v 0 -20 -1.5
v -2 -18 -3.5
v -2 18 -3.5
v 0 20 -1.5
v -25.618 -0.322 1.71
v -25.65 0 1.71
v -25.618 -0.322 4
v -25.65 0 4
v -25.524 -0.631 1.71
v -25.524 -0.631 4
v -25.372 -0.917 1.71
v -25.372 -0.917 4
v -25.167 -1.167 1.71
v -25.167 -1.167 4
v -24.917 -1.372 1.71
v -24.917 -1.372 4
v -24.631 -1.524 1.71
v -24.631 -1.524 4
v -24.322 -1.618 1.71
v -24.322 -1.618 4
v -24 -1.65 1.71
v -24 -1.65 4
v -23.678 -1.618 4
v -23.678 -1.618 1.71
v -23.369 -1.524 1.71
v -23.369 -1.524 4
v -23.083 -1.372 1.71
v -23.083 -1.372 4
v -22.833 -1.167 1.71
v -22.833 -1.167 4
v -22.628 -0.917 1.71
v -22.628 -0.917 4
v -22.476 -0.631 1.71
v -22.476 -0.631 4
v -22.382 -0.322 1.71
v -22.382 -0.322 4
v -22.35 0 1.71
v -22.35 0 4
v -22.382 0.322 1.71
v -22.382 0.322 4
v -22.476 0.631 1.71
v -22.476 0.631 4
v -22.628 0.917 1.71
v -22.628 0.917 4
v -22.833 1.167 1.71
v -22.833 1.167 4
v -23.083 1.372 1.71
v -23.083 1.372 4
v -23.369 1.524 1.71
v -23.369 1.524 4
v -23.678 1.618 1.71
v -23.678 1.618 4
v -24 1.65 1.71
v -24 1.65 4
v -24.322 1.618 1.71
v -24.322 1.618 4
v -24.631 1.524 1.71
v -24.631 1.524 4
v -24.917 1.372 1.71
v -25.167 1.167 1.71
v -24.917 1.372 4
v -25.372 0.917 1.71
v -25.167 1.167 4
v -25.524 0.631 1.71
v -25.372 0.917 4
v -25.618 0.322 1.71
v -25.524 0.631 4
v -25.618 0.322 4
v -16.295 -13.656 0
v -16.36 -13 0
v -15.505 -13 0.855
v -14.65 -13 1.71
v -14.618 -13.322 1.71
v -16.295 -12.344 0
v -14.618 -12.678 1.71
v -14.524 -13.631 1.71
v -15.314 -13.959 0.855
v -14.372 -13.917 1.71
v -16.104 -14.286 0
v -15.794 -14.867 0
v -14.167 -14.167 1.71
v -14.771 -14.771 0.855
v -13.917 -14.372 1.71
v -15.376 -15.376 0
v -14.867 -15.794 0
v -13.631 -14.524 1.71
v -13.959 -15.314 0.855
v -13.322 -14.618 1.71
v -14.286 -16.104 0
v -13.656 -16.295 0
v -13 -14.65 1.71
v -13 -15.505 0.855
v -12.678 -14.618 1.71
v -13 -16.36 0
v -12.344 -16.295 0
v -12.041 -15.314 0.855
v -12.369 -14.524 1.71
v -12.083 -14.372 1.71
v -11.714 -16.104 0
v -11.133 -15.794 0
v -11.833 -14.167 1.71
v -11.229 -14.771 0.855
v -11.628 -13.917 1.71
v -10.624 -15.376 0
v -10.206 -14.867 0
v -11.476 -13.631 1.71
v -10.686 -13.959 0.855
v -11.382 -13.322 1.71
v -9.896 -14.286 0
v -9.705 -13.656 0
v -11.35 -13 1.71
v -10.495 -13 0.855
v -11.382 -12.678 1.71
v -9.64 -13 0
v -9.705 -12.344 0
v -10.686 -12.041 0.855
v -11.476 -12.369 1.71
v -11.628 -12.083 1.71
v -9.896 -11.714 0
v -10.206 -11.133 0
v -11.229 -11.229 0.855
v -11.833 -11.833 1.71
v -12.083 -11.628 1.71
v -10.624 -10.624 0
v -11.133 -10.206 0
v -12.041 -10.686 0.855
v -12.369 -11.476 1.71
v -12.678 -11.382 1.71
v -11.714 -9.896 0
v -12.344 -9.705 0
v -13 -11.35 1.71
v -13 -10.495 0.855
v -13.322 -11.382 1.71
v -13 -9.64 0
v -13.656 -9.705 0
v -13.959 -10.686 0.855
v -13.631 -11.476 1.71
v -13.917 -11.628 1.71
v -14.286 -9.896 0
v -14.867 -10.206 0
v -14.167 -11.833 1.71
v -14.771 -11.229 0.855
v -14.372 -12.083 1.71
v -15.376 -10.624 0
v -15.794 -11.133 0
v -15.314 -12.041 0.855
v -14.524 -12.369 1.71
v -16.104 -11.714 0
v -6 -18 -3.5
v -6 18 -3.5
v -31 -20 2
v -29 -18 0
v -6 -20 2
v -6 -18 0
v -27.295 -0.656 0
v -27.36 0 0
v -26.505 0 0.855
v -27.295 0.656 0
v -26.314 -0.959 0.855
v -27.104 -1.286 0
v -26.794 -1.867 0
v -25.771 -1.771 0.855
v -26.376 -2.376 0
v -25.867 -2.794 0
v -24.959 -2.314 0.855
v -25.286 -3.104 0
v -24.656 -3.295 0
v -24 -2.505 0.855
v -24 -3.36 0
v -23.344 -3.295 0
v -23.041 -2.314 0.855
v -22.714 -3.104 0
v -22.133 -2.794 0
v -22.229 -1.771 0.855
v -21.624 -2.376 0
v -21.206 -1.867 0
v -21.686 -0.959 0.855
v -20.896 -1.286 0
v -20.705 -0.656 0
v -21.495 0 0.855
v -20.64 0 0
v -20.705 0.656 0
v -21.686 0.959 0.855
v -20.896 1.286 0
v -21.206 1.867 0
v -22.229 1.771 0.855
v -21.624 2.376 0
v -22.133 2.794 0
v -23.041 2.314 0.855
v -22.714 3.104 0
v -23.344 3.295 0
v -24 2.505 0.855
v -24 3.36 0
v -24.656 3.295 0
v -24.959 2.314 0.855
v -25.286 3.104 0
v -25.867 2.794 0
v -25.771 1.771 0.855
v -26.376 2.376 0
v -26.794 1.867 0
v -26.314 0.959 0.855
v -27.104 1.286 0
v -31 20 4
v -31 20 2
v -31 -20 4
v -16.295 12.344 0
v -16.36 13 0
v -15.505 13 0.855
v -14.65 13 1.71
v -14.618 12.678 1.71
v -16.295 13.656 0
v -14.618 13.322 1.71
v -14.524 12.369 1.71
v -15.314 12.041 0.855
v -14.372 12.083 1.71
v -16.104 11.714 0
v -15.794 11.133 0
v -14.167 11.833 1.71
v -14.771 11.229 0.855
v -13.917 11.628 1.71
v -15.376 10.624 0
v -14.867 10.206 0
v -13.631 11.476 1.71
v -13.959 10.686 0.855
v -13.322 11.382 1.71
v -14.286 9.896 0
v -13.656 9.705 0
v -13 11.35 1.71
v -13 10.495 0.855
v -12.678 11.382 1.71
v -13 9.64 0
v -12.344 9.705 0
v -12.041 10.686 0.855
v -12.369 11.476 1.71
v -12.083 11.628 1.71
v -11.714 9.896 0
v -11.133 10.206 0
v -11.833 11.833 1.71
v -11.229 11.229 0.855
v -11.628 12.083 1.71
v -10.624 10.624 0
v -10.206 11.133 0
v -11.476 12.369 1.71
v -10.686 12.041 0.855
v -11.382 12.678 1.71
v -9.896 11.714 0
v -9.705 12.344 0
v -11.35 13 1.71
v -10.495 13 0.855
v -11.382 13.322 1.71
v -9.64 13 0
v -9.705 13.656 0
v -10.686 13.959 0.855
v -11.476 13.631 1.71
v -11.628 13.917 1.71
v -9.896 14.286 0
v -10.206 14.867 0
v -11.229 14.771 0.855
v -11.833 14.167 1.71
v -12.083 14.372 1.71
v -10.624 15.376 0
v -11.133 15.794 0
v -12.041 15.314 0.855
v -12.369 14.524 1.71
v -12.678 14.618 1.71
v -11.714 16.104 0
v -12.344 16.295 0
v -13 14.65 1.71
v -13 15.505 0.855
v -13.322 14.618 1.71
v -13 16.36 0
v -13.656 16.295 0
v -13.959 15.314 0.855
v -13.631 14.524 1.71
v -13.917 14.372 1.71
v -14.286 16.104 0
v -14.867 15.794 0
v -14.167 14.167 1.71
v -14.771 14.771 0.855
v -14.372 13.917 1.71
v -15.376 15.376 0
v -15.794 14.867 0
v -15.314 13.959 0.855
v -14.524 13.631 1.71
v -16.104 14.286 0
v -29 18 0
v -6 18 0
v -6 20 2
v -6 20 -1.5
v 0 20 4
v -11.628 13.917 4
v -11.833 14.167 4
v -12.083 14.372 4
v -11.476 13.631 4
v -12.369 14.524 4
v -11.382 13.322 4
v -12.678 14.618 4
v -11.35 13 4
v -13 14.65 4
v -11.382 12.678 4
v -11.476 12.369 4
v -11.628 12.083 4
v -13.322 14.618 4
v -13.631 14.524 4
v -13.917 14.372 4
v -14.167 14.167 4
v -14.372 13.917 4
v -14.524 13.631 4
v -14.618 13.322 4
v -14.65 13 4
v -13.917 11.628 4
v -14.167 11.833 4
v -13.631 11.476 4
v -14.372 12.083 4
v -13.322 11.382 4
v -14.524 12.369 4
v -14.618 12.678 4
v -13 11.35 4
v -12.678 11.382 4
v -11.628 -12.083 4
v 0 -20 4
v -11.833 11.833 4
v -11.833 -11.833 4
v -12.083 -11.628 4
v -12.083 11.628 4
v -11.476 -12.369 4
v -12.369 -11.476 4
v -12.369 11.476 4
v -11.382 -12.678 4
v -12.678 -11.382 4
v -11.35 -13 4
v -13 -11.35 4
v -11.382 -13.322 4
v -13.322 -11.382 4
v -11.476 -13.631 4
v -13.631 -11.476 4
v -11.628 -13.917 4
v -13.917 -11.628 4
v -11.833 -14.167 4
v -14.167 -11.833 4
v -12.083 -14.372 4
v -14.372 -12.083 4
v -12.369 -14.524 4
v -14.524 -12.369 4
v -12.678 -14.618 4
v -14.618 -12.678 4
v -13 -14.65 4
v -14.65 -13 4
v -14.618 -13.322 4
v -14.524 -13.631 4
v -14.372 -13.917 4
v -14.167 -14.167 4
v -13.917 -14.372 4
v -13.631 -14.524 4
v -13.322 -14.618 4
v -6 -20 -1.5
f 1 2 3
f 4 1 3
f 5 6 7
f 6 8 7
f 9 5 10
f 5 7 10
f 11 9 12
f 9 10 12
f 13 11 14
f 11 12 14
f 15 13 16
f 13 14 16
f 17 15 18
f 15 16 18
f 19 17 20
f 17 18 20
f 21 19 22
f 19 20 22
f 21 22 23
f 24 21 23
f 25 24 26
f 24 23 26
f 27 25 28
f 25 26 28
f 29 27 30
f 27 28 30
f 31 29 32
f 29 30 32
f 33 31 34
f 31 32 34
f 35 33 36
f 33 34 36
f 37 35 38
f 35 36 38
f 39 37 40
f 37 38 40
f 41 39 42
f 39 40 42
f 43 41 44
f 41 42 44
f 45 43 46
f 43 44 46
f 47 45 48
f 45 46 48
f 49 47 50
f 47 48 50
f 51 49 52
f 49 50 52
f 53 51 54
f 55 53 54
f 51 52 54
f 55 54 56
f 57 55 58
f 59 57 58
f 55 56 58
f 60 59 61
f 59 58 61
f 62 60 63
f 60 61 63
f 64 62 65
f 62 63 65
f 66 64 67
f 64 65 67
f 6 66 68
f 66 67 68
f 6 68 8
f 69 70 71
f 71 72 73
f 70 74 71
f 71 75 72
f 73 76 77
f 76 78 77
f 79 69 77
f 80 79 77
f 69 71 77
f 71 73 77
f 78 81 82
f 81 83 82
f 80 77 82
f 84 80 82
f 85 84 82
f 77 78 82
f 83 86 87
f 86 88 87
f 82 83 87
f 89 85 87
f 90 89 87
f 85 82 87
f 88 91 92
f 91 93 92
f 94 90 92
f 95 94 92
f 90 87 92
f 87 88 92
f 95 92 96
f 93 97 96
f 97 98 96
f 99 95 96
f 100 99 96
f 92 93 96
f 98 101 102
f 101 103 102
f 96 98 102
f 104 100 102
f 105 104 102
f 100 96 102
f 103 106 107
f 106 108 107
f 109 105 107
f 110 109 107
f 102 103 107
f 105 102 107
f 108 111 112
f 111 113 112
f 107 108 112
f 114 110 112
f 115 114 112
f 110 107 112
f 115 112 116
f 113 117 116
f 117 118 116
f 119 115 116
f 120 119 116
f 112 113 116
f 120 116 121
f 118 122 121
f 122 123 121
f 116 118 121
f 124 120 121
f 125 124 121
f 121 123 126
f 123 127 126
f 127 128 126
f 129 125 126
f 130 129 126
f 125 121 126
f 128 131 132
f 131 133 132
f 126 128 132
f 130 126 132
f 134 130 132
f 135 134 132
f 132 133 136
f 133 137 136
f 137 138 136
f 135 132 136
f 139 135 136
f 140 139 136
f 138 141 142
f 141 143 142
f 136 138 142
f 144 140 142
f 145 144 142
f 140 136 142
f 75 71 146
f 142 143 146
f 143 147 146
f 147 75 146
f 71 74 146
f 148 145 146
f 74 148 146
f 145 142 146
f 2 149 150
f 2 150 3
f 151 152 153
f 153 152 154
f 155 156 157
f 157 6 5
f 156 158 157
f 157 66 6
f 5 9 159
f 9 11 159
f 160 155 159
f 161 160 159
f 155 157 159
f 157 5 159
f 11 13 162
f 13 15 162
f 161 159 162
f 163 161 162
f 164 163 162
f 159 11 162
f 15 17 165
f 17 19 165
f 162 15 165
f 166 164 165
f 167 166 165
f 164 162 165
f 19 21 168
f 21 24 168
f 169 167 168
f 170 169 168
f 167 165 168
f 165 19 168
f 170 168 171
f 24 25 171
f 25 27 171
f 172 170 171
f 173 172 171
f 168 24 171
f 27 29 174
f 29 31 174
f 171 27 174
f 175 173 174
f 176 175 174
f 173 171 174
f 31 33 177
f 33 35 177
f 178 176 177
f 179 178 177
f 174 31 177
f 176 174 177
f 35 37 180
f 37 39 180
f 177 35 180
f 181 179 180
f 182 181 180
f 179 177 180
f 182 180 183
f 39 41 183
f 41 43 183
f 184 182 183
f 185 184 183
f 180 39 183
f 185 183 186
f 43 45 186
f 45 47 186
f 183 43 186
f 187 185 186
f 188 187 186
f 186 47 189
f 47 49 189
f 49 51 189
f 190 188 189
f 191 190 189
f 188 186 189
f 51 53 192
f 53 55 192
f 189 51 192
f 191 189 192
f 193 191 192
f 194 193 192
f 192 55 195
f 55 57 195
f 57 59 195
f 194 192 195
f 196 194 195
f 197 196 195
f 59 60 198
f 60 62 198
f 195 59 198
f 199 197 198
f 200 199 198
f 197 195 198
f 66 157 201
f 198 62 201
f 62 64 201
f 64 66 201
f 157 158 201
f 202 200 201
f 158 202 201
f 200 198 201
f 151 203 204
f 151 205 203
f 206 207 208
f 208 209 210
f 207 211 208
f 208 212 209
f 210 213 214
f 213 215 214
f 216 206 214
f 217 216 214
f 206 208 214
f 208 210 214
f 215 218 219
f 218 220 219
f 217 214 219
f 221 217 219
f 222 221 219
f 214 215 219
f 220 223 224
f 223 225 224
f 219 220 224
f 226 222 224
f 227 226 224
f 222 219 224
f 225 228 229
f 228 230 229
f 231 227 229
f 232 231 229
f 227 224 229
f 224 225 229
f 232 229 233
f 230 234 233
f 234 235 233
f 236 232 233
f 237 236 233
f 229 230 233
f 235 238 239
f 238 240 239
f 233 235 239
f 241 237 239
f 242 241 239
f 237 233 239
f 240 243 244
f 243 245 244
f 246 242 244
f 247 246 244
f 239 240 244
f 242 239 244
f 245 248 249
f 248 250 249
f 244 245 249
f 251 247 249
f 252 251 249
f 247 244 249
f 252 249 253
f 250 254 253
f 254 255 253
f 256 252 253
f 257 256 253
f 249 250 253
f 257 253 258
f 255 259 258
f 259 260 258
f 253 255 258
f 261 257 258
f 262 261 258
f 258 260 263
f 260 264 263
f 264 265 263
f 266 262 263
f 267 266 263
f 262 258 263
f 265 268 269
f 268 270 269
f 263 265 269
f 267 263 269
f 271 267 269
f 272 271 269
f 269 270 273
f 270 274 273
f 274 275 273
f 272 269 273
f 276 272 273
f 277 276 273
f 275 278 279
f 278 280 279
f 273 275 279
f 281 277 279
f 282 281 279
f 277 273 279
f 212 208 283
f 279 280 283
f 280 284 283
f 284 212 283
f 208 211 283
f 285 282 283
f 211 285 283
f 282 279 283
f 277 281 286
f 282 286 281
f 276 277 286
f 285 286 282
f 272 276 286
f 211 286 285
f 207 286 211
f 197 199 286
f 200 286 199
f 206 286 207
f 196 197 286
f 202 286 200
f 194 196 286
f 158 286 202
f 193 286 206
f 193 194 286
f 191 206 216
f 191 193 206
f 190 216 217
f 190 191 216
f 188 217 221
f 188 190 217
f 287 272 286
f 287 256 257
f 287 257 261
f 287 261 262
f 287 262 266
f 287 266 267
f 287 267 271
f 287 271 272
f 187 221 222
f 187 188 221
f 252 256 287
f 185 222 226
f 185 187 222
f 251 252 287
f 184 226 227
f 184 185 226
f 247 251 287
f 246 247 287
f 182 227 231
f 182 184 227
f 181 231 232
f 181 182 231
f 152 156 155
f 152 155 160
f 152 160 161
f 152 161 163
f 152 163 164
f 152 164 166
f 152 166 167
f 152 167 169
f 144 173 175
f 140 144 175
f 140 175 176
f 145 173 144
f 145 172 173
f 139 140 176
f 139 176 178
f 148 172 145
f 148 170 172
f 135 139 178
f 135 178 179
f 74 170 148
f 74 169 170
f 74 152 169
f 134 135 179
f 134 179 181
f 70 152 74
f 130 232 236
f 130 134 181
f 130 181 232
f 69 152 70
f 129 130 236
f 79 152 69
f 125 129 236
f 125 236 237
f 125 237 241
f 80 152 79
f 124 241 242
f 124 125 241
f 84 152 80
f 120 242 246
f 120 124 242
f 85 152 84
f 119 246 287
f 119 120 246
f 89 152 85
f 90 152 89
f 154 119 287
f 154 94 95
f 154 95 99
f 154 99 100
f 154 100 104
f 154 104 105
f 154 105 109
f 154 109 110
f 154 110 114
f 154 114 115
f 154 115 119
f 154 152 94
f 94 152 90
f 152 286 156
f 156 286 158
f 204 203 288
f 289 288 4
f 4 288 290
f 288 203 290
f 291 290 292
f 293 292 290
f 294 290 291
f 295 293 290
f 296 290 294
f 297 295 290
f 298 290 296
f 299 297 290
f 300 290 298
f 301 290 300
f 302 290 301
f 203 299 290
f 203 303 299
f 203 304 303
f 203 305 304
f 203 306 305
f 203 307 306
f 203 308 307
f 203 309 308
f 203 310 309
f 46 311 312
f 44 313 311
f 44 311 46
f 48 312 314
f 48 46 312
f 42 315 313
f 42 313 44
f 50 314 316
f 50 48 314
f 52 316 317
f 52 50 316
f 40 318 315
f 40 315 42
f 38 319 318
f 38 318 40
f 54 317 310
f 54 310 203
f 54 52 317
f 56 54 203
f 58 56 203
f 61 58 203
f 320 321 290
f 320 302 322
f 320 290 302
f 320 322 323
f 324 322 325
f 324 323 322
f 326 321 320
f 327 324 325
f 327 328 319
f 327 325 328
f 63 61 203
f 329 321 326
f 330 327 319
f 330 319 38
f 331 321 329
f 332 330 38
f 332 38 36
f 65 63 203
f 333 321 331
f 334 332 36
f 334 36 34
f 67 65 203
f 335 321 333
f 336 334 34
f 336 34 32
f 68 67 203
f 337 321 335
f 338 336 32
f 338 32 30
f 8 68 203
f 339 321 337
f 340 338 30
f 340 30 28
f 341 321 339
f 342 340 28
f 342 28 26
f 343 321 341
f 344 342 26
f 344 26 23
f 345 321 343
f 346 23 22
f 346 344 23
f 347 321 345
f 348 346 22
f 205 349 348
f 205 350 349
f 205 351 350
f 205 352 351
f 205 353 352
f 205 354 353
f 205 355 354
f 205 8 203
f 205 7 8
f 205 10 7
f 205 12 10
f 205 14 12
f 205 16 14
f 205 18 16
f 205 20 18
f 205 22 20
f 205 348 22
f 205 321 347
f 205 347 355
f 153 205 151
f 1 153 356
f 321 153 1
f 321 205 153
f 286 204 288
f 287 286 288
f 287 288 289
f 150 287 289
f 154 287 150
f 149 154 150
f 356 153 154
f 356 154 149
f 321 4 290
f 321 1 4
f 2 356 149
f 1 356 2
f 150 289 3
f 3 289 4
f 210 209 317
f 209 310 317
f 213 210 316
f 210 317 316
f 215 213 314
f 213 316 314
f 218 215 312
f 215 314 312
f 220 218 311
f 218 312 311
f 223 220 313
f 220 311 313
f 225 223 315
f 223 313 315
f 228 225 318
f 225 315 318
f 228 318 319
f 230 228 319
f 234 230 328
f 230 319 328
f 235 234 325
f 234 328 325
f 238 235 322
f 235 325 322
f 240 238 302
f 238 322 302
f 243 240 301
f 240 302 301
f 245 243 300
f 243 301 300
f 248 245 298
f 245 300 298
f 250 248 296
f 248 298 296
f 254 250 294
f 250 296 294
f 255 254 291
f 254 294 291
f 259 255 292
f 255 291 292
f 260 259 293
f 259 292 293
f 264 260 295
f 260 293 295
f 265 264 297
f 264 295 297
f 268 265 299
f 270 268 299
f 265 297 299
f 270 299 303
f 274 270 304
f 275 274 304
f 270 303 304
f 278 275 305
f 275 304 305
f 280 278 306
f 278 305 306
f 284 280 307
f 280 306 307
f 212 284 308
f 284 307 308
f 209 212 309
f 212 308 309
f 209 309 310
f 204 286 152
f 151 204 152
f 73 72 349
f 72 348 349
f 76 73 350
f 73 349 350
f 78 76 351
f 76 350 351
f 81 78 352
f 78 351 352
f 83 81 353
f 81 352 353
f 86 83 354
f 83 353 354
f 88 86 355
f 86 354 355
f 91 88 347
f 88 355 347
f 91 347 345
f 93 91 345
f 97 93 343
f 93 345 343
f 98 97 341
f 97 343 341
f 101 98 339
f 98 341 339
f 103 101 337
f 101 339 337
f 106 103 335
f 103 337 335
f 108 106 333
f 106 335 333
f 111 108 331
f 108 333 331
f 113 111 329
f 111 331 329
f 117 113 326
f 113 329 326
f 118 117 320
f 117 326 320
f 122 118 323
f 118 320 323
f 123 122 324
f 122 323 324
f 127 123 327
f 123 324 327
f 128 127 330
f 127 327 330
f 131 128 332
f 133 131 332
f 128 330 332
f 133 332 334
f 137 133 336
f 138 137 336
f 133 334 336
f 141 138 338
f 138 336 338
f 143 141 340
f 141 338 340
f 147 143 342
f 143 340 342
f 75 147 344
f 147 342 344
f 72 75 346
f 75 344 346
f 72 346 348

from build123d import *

# Parameters (mm, degrees)
F1_DEPTH       = 20
F3_D           = 3.3
F3_CSINK_D     = 6.72
F3_CSINK_ANGLE = 90
F4_SIZE        = 2


with BuildPart() as f1:
    # F0 (on Front) → F1 (new body, symmetric)
    with BuildSketch(Plane.XZ):
        Polygon((-31, 4), (-31, 0), (-6, 0), (-6, -3.5), (0, -3.5), (0, 4), align=None)
    extrude(amount=F1_DEPTH, both=True)

    # F3 (through all)
    with Locations(Plane(origin=(0, 0, 0), x_dir=(1, 0, 0), z_dir=(0, 0, -1))):
        with Locations((-13, -13), (-24, 0), (-13, 13)):
            CounterSinkHole(F3_D / 2, F3_CSINK_D / 2, counter_sink_angle=F3_CSINK_ANGLE)

    # F4
    f4_edges = [f1.edges().sort_by_distance(p)[0] for p in [
        (-18.5, -20, 0),
        (-31, 0, 0),
        (-18.5, 20, 0),
        (-3, -20, -3.5),
        (-3, 20, -3.5),
        (0, 0, -3.5),
    ]]
    chamfer(f4_edges, length=F4_SIZE)


solid = f1.part
